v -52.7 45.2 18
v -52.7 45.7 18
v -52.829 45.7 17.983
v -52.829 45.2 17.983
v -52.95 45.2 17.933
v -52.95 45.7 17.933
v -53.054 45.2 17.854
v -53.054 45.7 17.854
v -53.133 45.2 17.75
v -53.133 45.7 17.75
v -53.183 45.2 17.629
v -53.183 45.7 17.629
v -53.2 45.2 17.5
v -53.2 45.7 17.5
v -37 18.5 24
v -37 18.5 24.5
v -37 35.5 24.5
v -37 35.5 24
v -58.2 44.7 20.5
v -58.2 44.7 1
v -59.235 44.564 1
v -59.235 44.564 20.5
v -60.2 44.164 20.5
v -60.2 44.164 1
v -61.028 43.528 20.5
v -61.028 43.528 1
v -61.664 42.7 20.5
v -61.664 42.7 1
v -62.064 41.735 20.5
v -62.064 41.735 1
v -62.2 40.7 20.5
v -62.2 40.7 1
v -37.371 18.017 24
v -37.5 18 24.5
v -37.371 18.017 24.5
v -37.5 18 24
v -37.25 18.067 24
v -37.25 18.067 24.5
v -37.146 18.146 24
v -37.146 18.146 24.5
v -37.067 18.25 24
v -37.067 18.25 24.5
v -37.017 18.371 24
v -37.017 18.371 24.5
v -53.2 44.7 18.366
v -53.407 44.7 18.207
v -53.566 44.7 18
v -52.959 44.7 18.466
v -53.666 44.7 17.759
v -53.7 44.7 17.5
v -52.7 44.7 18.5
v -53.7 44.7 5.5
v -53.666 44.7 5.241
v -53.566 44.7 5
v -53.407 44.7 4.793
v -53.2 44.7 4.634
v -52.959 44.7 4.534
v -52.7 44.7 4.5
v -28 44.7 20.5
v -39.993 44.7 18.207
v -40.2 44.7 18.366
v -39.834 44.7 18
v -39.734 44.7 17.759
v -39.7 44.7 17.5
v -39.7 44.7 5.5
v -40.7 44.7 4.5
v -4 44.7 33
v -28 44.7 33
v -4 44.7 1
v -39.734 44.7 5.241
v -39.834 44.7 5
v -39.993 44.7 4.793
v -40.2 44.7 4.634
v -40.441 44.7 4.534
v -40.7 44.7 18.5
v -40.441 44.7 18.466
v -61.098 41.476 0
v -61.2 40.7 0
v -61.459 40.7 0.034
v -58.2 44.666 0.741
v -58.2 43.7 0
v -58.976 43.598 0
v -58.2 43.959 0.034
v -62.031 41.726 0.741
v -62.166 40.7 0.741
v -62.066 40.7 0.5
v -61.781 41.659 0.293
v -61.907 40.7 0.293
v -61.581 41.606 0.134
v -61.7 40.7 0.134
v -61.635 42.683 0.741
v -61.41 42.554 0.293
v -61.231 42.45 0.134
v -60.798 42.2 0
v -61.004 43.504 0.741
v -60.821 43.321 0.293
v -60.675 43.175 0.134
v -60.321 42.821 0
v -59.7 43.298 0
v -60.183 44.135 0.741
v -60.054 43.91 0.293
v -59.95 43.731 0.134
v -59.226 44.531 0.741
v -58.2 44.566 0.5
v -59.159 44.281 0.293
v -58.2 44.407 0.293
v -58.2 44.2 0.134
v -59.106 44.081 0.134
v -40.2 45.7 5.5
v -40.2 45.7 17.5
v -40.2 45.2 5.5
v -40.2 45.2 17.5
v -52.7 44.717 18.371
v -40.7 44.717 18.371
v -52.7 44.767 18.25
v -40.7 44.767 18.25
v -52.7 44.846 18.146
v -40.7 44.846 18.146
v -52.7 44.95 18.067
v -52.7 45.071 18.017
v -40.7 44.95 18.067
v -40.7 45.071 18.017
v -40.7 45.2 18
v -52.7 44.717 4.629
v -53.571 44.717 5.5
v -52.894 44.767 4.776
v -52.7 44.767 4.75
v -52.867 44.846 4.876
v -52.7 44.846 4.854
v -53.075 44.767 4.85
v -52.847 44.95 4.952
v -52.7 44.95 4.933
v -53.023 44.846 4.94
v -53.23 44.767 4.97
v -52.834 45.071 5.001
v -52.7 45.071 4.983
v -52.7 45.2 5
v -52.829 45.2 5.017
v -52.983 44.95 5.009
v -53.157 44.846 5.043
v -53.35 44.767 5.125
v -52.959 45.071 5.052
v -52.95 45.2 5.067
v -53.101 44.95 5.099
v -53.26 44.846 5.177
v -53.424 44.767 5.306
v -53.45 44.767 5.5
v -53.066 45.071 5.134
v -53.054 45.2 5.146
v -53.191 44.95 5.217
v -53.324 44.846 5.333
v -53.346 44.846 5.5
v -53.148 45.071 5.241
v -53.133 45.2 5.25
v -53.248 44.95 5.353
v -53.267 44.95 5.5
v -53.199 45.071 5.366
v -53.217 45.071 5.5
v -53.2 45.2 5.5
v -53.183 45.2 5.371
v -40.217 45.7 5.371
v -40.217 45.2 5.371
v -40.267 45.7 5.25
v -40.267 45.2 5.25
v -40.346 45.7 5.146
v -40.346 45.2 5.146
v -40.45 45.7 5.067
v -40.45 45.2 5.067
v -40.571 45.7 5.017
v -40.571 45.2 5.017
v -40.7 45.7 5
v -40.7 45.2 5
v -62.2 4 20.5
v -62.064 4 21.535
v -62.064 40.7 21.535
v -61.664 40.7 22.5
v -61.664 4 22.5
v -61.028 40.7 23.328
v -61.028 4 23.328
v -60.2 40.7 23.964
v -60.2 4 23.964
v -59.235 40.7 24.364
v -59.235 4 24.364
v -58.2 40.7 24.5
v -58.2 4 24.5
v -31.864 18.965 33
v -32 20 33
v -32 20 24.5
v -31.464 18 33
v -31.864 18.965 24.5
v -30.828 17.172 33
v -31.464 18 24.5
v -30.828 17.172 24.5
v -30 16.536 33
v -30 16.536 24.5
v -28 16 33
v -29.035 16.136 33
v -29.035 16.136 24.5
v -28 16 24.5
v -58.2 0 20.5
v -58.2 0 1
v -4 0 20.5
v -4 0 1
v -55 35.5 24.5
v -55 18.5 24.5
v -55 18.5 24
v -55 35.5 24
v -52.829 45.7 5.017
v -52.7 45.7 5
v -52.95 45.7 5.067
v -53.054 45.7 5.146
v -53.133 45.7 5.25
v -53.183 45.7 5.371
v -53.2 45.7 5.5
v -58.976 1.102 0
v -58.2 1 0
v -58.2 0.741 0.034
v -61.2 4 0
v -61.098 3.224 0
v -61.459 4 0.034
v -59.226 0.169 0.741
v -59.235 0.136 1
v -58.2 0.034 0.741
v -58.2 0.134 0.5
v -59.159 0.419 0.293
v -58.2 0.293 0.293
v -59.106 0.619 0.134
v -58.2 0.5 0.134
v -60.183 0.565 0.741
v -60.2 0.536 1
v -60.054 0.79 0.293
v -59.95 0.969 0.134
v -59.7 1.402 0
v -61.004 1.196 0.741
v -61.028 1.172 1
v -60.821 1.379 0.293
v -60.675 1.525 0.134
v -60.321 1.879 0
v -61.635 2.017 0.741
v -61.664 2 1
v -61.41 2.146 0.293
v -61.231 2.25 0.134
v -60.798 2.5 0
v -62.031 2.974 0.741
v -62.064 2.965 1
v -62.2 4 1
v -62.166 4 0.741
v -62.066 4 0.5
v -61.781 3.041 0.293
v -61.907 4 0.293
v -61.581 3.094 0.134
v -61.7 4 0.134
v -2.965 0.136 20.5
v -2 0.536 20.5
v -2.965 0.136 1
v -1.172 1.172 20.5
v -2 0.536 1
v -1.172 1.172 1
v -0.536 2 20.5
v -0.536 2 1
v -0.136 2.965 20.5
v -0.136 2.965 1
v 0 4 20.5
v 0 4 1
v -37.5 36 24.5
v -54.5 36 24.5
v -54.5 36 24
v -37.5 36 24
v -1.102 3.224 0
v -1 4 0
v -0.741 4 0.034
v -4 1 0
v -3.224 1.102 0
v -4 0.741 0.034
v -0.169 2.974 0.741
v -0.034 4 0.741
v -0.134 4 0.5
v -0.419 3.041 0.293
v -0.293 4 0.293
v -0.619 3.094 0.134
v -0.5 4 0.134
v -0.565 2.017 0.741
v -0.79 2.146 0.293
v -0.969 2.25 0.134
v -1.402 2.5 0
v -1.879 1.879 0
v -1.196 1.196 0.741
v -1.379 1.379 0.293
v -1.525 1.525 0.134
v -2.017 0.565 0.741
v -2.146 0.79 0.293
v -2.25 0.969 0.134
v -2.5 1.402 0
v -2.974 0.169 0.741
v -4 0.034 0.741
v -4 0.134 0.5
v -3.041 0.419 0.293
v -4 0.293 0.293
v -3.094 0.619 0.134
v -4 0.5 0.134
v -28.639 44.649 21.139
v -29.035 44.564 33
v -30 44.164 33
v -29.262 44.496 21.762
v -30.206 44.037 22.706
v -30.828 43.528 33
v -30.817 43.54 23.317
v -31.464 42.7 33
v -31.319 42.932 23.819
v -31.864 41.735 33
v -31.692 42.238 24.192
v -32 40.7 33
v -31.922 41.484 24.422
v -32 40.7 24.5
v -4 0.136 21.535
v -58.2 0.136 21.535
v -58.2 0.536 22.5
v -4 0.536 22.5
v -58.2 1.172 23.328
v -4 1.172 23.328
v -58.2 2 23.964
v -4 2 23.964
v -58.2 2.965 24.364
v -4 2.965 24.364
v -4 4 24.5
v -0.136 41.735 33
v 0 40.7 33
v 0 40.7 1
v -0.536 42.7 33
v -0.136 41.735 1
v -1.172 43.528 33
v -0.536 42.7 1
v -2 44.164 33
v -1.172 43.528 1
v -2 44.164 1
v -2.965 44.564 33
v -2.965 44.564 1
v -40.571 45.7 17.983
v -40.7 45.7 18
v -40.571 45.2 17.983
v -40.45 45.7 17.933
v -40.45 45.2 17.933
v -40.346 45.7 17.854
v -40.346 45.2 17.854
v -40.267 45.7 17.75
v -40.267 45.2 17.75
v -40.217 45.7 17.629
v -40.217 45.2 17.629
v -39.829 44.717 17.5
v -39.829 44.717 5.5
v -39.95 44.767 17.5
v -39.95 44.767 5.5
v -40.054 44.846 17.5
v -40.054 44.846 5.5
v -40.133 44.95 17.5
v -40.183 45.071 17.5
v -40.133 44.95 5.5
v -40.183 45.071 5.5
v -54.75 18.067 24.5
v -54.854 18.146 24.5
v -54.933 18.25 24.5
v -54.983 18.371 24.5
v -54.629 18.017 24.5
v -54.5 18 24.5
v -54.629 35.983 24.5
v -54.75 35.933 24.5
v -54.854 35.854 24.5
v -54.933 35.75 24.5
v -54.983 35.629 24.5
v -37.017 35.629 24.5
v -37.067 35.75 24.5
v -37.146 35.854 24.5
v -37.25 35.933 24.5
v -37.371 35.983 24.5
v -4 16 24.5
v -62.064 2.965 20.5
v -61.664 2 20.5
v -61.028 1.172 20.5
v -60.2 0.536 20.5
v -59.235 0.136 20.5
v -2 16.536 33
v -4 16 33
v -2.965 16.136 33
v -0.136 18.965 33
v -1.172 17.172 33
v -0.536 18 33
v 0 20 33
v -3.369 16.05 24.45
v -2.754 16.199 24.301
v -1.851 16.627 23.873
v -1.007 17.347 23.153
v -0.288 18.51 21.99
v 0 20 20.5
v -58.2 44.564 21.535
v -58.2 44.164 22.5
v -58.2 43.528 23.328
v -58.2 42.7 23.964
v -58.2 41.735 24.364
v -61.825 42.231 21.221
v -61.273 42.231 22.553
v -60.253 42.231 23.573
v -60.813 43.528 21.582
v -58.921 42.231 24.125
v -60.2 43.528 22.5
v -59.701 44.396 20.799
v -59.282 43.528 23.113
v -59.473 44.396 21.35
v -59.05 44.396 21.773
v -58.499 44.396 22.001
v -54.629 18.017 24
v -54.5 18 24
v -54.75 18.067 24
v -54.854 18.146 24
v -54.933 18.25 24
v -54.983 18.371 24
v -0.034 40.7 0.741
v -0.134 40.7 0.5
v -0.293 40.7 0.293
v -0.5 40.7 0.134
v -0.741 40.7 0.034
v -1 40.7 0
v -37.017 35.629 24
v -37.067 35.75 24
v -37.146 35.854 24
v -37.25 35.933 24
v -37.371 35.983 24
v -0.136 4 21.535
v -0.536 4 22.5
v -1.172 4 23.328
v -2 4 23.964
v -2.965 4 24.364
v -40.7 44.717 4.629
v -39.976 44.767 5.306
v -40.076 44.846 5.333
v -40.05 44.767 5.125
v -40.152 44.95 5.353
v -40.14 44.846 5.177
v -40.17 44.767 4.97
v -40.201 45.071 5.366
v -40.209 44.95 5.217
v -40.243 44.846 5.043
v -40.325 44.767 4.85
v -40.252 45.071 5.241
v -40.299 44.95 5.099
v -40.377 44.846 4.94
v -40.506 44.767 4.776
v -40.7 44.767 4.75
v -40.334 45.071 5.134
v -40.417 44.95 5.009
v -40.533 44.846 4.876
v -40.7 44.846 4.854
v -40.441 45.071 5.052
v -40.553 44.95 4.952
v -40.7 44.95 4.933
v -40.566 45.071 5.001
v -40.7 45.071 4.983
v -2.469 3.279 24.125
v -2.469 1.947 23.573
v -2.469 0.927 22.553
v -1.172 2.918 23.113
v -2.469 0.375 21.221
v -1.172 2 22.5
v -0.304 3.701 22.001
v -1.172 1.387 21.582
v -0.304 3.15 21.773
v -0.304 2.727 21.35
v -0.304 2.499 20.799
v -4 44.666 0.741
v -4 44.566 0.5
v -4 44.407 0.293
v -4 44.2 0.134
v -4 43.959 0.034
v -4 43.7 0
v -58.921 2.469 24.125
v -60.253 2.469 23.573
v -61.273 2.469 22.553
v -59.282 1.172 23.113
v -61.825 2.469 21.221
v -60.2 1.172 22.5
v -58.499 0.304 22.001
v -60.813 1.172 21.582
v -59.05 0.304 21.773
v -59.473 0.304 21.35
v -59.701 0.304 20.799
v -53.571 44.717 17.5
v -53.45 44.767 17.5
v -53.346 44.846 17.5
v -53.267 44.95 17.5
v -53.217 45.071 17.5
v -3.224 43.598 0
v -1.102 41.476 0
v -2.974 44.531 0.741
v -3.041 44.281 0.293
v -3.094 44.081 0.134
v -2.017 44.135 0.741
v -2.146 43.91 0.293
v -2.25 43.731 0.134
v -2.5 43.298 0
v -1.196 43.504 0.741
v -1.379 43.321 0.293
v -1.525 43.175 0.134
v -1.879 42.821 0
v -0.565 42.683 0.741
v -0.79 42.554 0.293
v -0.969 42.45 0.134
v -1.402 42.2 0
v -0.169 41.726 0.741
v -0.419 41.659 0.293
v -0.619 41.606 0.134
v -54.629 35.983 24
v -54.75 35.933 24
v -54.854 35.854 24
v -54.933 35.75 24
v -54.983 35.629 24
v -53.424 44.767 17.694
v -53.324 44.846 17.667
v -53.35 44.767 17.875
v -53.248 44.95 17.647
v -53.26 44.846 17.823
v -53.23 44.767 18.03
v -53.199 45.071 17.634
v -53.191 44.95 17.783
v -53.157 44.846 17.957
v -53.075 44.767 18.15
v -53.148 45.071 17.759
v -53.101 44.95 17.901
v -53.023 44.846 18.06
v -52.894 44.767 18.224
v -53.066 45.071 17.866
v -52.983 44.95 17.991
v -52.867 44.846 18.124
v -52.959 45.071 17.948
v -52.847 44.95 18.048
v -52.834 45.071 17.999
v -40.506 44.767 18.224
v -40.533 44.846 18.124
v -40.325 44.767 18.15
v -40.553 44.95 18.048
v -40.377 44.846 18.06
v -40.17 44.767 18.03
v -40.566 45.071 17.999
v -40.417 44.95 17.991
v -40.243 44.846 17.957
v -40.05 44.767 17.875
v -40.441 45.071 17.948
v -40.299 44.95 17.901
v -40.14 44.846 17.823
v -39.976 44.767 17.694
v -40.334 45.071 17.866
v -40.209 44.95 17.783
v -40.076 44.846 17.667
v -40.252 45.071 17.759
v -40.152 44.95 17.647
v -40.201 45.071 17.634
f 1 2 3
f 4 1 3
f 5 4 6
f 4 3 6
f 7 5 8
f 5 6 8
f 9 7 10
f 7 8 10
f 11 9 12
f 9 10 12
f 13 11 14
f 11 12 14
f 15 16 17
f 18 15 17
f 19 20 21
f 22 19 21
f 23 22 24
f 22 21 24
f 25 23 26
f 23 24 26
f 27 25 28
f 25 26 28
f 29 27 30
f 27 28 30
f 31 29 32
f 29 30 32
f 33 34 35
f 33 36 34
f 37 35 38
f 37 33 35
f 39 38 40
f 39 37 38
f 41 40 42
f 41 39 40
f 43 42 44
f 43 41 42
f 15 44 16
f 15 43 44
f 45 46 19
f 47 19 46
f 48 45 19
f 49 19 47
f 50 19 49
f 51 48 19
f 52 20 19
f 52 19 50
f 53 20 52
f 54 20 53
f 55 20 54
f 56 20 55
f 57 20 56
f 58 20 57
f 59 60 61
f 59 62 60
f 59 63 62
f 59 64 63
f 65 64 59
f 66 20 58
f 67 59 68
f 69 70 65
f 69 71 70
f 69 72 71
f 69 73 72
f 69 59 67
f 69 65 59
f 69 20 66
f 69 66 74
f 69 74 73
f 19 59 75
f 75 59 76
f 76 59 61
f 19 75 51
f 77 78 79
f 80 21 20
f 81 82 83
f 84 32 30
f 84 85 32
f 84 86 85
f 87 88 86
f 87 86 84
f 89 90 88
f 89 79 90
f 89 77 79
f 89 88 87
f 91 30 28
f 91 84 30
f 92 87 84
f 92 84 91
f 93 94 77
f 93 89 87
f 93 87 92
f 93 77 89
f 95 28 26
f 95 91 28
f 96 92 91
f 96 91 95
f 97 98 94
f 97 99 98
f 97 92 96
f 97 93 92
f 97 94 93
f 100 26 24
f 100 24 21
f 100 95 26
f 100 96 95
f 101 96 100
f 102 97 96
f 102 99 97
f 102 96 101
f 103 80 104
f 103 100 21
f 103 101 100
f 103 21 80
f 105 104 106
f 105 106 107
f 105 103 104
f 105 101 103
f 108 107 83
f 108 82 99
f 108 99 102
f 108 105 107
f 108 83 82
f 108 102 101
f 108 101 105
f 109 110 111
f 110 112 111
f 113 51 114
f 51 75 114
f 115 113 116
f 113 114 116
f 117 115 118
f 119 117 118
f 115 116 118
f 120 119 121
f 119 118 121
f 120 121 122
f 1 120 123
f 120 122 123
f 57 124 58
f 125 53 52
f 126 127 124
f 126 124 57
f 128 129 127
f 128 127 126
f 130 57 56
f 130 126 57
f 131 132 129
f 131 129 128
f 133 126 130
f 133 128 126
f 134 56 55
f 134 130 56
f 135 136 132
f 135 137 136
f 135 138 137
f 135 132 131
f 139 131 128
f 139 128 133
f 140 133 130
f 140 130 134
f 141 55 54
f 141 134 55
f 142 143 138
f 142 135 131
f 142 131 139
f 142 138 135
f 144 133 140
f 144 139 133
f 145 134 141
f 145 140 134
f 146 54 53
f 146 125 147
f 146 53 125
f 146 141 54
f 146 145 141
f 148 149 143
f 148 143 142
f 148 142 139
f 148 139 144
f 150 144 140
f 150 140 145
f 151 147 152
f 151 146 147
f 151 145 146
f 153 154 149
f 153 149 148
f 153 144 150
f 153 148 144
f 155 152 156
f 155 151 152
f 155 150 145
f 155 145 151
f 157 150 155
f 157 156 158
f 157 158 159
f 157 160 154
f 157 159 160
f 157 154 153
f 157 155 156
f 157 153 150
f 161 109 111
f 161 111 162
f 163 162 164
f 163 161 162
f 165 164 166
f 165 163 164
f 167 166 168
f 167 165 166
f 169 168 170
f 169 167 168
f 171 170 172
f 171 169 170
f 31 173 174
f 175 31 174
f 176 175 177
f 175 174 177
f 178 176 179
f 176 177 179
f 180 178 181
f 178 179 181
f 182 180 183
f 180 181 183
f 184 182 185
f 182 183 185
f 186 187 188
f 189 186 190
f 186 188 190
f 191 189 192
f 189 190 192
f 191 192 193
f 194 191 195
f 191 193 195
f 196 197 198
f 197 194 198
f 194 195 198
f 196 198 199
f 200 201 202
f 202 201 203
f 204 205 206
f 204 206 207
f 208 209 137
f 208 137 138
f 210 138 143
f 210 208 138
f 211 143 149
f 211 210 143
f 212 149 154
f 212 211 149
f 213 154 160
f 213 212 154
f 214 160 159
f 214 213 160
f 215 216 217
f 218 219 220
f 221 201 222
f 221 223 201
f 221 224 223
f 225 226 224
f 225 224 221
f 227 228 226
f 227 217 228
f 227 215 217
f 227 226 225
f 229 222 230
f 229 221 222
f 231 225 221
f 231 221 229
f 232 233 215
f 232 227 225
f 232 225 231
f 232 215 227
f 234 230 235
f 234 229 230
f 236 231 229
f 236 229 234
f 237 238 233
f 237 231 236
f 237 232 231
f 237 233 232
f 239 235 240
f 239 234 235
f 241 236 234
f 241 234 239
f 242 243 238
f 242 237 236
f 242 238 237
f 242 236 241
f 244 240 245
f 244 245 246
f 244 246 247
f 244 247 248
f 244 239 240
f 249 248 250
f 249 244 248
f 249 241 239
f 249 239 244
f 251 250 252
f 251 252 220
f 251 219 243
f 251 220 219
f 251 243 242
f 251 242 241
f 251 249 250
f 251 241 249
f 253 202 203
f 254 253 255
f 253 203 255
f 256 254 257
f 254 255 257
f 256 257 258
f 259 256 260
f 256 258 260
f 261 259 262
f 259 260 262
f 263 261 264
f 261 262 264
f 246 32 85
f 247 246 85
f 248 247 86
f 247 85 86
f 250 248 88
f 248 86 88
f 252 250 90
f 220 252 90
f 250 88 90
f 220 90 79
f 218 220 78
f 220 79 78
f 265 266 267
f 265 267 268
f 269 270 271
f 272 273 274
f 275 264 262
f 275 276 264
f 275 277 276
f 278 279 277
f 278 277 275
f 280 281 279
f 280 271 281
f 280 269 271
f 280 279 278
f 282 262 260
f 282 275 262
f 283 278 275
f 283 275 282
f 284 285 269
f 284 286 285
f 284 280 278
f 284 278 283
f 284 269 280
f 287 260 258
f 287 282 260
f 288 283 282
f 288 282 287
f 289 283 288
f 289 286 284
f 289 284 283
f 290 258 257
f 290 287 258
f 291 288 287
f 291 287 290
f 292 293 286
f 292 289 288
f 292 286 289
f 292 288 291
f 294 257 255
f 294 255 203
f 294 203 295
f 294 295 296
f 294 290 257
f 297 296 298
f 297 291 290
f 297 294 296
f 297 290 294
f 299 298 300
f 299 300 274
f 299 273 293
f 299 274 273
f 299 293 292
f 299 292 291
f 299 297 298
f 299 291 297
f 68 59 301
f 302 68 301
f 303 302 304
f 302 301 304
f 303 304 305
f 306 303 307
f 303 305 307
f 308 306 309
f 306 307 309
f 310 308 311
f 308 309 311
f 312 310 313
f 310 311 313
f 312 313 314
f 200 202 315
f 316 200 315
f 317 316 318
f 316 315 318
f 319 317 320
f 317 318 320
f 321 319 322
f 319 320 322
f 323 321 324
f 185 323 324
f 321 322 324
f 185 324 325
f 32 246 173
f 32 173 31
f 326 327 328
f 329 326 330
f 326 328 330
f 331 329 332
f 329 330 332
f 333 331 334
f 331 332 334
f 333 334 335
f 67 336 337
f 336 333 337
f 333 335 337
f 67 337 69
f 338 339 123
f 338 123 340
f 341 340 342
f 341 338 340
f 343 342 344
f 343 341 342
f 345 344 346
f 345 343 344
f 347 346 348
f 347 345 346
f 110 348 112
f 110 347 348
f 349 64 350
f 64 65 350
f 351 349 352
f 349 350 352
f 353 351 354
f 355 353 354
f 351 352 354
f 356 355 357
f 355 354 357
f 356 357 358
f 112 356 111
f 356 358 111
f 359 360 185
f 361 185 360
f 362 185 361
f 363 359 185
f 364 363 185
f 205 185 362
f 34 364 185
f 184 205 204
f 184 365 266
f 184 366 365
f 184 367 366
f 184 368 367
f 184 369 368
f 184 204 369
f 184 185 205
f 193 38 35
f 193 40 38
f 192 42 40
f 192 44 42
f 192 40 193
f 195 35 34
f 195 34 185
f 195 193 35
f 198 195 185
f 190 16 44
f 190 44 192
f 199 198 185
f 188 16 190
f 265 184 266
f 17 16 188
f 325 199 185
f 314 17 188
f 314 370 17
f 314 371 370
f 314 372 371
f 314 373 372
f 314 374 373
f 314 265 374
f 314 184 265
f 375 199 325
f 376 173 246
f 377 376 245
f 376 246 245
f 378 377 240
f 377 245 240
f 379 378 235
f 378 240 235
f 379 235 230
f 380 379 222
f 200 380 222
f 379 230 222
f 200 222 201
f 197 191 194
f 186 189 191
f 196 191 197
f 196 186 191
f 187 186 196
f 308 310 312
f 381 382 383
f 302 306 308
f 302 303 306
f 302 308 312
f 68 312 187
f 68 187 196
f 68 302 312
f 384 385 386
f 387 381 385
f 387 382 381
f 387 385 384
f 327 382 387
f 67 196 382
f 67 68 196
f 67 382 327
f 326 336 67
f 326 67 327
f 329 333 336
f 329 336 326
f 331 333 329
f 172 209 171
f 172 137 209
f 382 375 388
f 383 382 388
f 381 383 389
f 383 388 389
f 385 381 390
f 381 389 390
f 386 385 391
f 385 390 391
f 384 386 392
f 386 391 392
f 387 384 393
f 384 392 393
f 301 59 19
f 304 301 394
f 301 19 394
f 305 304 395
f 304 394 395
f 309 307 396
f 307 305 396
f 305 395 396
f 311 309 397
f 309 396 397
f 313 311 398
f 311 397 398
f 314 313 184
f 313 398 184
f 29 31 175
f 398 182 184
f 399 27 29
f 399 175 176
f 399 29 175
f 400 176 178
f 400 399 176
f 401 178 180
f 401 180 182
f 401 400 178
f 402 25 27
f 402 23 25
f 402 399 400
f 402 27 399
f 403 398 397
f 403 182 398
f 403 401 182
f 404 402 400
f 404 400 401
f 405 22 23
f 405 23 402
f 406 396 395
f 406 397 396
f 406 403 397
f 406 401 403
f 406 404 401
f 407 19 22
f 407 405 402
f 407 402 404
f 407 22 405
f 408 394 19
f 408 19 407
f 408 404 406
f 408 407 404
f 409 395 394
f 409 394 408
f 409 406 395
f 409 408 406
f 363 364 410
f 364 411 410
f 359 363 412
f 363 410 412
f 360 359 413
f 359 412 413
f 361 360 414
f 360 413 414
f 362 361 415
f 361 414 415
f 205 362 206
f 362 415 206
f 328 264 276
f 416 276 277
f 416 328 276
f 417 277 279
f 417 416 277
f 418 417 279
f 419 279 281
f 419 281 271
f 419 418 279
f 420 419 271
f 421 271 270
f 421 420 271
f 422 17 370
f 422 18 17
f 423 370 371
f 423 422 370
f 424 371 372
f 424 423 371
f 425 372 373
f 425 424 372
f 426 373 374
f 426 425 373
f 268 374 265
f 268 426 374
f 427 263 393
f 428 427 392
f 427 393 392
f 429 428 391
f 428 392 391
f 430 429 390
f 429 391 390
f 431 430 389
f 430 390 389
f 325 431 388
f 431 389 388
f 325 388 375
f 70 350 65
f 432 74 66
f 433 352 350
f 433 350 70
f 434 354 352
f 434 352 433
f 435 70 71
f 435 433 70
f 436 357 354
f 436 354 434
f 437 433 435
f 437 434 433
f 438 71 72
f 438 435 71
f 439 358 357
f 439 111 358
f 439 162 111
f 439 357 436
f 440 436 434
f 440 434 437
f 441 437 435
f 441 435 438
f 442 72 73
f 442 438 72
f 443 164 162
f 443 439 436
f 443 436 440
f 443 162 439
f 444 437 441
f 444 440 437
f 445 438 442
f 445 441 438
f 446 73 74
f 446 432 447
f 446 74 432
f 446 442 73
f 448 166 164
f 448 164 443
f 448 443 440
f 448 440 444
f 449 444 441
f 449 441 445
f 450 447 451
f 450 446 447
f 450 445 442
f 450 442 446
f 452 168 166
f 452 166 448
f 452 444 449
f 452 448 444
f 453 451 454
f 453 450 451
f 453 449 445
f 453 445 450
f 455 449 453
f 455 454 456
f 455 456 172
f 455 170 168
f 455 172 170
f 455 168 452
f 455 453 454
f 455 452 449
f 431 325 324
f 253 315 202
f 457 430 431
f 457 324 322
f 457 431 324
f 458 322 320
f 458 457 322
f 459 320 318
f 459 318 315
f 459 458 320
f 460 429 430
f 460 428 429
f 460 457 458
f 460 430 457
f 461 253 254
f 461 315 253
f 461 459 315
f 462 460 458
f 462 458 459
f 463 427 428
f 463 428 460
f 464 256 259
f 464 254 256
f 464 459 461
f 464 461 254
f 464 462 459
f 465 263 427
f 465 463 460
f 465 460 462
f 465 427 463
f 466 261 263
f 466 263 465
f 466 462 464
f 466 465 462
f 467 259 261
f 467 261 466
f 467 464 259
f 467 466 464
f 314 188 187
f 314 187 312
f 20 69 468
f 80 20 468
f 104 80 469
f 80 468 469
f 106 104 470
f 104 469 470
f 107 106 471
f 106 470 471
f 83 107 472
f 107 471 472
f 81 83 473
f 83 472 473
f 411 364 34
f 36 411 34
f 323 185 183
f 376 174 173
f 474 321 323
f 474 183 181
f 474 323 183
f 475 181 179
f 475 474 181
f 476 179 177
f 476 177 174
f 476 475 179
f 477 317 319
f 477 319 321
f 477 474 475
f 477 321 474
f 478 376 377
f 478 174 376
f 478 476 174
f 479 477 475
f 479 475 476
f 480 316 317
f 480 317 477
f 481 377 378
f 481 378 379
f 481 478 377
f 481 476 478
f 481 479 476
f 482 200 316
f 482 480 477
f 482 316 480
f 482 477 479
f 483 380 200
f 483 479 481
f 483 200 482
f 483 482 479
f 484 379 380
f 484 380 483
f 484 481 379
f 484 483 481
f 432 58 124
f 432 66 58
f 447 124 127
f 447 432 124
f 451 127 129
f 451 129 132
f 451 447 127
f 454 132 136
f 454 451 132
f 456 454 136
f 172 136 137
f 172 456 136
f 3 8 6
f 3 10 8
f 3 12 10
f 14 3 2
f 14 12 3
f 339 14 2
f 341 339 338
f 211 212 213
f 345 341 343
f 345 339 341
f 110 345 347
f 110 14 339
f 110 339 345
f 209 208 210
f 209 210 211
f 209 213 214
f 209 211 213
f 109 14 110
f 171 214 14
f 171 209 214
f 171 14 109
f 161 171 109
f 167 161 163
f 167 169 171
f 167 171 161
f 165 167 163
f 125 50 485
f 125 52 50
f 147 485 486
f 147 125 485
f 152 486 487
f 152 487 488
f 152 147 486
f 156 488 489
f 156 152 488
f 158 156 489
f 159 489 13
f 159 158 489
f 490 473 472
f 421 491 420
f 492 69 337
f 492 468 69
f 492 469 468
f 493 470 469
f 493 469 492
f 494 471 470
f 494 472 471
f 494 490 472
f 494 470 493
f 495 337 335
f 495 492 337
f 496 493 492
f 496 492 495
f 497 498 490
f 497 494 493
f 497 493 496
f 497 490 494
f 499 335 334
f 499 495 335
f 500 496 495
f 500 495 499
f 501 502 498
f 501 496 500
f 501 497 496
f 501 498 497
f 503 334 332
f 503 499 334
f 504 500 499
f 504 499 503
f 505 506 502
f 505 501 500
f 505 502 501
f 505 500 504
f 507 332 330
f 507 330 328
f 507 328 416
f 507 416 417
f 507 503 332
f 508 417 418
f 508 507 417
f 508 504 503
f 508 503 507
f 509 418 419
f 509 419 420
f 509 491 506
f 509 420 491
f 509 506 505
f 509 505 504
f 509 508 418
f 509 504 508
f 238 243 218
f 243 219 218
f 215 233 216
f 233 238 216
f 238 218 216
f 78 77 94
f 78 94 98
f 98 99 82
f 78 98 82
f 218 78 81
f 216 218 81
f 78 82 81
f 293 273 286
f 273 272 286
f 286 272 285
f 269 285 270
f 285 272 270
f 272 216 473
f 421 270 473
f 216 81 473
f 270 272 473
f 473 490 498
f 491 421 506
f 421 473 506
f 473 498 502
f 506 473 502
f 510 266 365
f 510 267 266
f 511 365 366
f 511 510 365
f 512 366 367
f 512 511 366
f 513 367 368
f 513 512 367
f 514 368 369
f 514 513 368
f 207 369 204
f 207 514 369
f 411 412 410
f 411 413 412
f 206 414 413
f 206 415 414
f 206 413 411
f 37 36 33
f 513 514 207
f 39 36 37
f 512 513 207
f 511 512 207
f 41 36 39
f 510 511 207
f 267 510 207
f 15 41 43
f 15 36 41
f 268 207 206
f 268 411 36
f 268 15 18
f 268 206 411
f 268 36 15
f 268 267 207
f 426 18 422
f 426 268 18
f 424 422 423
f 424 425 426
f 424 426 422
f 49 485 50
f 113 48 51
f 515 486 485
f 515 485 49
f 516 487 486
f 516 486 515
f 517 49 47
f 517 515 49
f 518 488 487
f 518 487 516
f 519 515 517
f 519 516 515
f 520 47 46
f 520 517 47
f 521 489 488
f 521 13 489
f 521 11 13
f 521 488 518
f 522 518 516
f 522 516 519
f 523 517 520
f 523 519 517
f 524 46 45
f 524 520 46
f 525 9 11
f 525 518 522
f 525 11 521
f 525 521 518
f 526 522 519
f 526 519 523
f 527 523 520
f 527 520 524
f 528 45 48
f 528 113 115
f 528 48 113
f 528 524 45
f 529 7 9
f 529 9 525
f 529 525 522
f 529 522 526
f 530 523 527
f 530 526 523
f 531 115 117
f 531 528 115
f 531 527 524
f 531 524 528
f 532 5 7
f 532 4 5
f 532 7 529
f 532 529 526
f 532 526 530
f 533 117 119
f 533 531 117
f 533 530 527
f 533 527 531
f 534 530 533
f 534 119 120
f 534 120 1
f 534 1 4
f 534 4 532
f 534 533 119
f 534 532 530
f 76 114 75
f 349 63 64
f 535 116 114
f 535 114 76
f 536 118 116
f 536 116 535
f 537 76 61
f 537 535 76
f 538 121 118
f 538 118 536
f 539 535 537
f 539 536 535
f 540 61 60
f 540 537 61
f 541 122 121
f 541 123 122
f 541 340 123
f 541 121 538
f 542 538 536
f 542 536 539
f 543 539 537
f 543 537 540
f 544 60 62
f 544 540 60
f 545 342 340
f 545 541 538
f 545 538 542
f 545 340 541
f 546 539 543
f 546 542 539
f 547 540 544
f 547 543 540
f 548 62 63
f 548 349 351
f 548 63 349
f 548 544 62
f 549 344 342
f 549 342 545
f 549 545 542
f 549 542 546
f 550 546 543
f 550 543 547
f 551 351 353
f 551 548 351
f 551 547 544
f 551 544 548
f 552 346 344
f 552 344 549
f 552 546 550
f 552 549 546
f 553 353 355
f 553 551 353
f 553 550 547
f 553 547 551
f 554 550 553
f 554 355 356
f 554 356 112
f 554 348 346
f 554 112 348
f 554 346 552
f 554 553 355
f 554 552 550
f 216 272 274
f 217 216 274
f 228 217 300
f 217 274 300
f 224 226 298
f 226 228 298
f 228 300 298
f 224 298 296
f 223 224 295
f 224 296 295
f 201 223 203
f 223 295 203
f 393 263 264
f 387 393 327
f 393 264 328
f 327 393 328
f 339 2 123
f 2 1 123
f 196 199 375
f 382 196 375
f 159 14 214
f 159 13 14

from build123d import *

# Parameters (mm, degrees)
CROQUIS1_W              = 62.2
CROQUIS1_H              = 44.7
SALIENTE_EXTRUIR1_DEPTH = 24.5
CROQUIS2_W              = 32
CROQUIS2_H              = 28.7
SALIENTE_EXTRUIR2_DEPTH = 8.5
CROQUIS3_W              = 18
CROQUIS3_H              = 18
CORTAR_EXTRUIR1_DEPTH   = 0.5
CROQUIS4_W              = 13
CROQUIS4_H              = 13
SALIENTE_EXTRUIR3_DEPTH = 1
REDONDEO2_R             = 0.5
REDONDEO3_R             = 1
REDONDEO1_R             = 4


with BuildPart() as part:
    # Croquis1 → Saliente-Extruir1 (new body)
    with BuildSketch(Plane.XY):
        with Locations((-31.1, 22.35)):
            Rectangle(CROQUIS1_W, CROQUIS1_H)
    extrude(amount=SALIENTE_EXTRUIR1_DEPTH)

    # Croquis2 → Saliente-Extruir2 (add)
    with BuildSketch(Plane.XY.offset(24.5)):
        with Locations((-16, 30.35)):
            Rectangle(CROQUIS2_W, CROQUIS2_H)
    extrude(amount=SALIENTE_EXTRUIR2_DEPTH)

    # Croquis3 → Cortar-Extruir1 (cut)
    with BuildSketch(Plane.XY.offset(24.5)):
        with Locations((-46, 27)):
            Rectangle(CROQUIS3_W, CROQUIS3_H)
    extrude(amount=-CORTAR_EXTRUIR1_DEPTH, mode=Mode.SUBTRACT)

    # Croquis4 → Saliente-Extruir3 (add)
    with BuildSketch(Plane(origin=(0, 44.7, 0), x_dir=(1, 0, 0), z_dir=(0, 1, 0))):
        with Locations((-46.7, -11.5)):
            Rectangle(CROQUIS4_W, CROQUIS4_H)
    extrude(amount=SALIENTE_EXTRUIR3_DEPTH)

    # Redondeo2
    redondeo2_edges = [part.edges().sort_by_distance(p)[0] for p in [
        (-55, 18, 24.25),
        (-55, 36, 24.25),
        (-37, 36, 24.25),
        (-37, 18, 24.25),
        (-40.2, 44.7, 11.5),
        (-40.2, 45.2, 18),
        (-46.7, 44.7, 5),
        (-40.2, 45.2, 5),
        (-53.2, 44.7, 11.5),
        (-53.2, 45.2, 5),
        (-46.7, 44.7, 18),
        (-53.2, 45.2, 18),
    ]]
    fillet(redondeo2_edges, radius=REDONDEO2_R)

    # Redondeo3
    redondeo3_edges = [part.edges().sort_by_distance(p)[0] for p in [
        (-31.1, 0, 0),
        (-62.2, 22.35, 0),
        (-31.1, 44.7, 0),
        (0, 22.35, 0),
    ]]
    fillet(redondeo3_edges, radius=REDONDEO3_R)

    # Redondeo1
    # the kernel refuses this fillet: 4 mm, written as the material it takes off along each edge
    with BuildSketch(Plane(origin=(-4, 40.7, 0), x_dir=(0, 1, 0), z_dir=(-1, 0, 0))) as redondeo1_piece_1:
        with BuildLine():
            CenterArc((3, -1), 1, 0, 90)
            Line((4, -1), (4, 0))
            Line((4, 0), (3, 0))
        make_face()
    revolve(axis=Axis((-4, 40.7, 0), (0, 0, -1)), revolution_arc=90, mode=Mode.SUBTRACT)
    with BuildSketch(Plane(origin=(-4, 4, 0), x_dir=(1, 0, 0), z_dir=(0, 1, 0))) as redondeo1_piece_2:
        with BuildLine():
            CenterArc((3, -1), 1, 0, 90)
            Line((4, -1), (4, 0))
            Line((4, 0), (3, 0))
        make_face()
    revolve(axis=Axis((-4, 4, 0), (0, 0, -1)), revolution_arc=90, mode=Mode.SUBTRACT)
    with BuildSketch(Plane(origin=(-58.2, 40.7, 0), x_dir=(-1, 0, 0), z_dir=(0, -1, 0))) as redondeo1_piece_3:
        with BuildLine():
            CenterArc((3, -1), 1, 0, 90)
            Line((4, -1), (4, 0))
            Line((4, 0), (3, 0))
        make_face()
    revolve(axis=Axis((-58.2, 40.7, 0), (0, 0, -1)), revolution_arc=90, mode=Mode.SUBTRACT)
    with BuildSketch(Plane(origin=(-58.2, 4, 0), x_dir=(0, -1, 0), z_dir=(1, 0, 0))) as redondeo1_piece_4:
        with BuildLine():
            CenterArc((3, -1), 1, 0, 90)
            Line((4, -1), (4, 0))
            Line((4, 0), (3, 0))
        make_face()
    revolve(axis=Axis((-58.2, 4, 0), (0, 0, -1)), revolution_arc=90, mode=Mode.SUBTRACT)
    with BuildSketch(Plane(origin=(-58.2, 4, 20.5), x_dir=(0, 0, 1), z_dir=(0, -1, 0))) as redondeo1_piece_5_section:
        Polygon((0, 0), (REDONDEO1_R, 0), (REDONDEO1_R, REDONDEO1_R), (0, REDONDEO1_R), align=None)
    redondeo1_piece_5 = extrude(amount=REDONDEO1_R, mode=Mode.PRIVATE)
    redondeo1_piece_5 = redondeo1_piece_5 - Plane(origin=(-58.2, 4, 20.5), x_dir=(0.7071067811865475, 0, -0.7071067811865475), z_dir=(0, -1, 0)) * Sphere(REDONDEO1_R, mode=Mode.PRIVATE)
    add(redondeo1_piece_5, mode=Mode.SUBTRACT)
    with BuildSketch(Plane(origin=(-58.2, 40.7, 20.5), x_dir=(0, 0, 1), z_dir=(0, 1, 0))) as redondeo1_piece_6_section:
        Polygon((0, 0), (REDONDEO1_R, 0), (REDONDEO1_R, -REDONDEO1_R), (0, -REDONDEO1_R), align=None)
    redondeo1_piece_6 = extrude(amount=REDONDEO1_R, mode=Mode.PRIVATE)
    redondeo1_piece_6 = redondeo1_piece_6 - Plane(origin=(-58.2, 40.7, 20.5), x_dir=(0.7071067811865475, 0, -0.7071067811865475), z_dir=(0, 1, 0)) * Sphere(REDONDEO1_R, mode=Mode.PRIVATE)
    add(redondeo1_piece_6, mode=Mode.SUBTRACT)
    with BuildSketch(Plane(origin=(-4, 4, 20.5), x_dir=(0, -1, 0), z_dir=(1, 0, 0))) as redondeo1_piece_7_section:
        Polygon((0, 0), (REDONDEO1_R, 0), (REDONDEO1_R, -REDONDEO1_R), (0, -REDONDEO1_R), align=None)
    redondeo1_piece_7 = extrude(amount=REDONDEO1_R, mode=Mode.PRIVATE)
    redondeo1_piece_7 = redondeo1_piece_7 - Plane(origin=(-4, 4, 20.5), x_dir=(0, 0.7071067811865475, -0.7071067811865475), z_dir=(1, 0, 0)) * Sphere(REDONDEO1_R, mode=Mode.PRIVATE)
    add(redondeo1_piece_7, mode=Mode.SUBTRACT)
    with BuildSketch(Plane(origin=(-62.2, 4, 24.5), x_dir=(1, 0, 0), z_dir=(0, 1, 0))) as redondeo1_piece_8:
        with BuildLine():
            CenterArc((REDONDEO1_R, REDONDEO1_R), REDONDEO1_R, 180, 90)
            Line((0, REDONDEO1_R), (0, 0))
            Line((0, 0), (REDONDEO1_R, 0))
        make_face()
    extrude(amount=36.7, mode=Mode.SUBTRACT)
    with BuildSketch(Plane(origin=(-4, 0, 24.5), x_dir=(0, 0, -1), z_dir=(-1, 0, 0))) as redondeo1_piece_9:
        with BuildLine():
            CenterArc((REDONDEO1_R, -REDONDEO1_R), REDONDEO1_R, 90, 90)
            Line((0, -REDONDEO1_R), (0, 0))
            Line((0, 0), (REDONDEO1_R, 0))
        make_face()
    extrude(amount=54.2, mode=Mode.SUBTRACT)
    with BuildSketch(Plane(origin=(-58.2, 44.7, 24.5), x_dir=(0, 0, -1), z_dir=(1, 0, 0))) as redondeo1_piece_10:
        with BuildLine():
            CenterArc((REDONDEO1_R, -REDONDEO1_R), REDONDEO1_R, 90, 90)
            Line((0, -REDONDEO1_R), (0, 0))
            Line((0, 0), (REDONDEO1_R, 0))
        make_face()
    extrude(amount=26.2, mode=Mode.SUBTRACT)
    with BuildSketch(Plane(origin=(0, 16, 24.5), x_dir=(0, 1, 0), z_dir=(0, 0, 1)), Plane(origin=(-32, 16, 24.5), x_dir=(1, 0, 0), z_dir=(0, 0, 1))) as redondeo1_piece_11:
        with BuildLine():
            CenterArc((REDONDEO1_R, REDONDEO1_R), REDONDEO1_R, 180, 90)
            Line((0, REDONDEO1_R), (0, 0))
            Line((0, 0), (REDONDEO1_R, 0))
        make_face()
    extrude(amount=18.5, mode=Mode.SUBTRACT)
    with BuildSketch(Plane(origin=(-32, 44.7, 24.5), x_dir=(1, 0, 0), z_dir=(0, 0, 1))) as redondeo1_piece_12:
        with BuildLine():
            CenterArc((REDONDEO1_R, -REDONDEO1_R), REDONDEO1_R, 90, 90)
            Line((0, -REDONDEO1_R), (0, 0))
            Line((0, 0), (REDONDEO1_R, 0))
        make_face()
    extrude(amount=18.5, mode=Mode.SUBTRACT)
    with BuildSketch(Plane(origin=(0, 16, 24.5), x_dir=(0, 0, -1), z_dir=(0, -1, 0))) as redondeo1_piece_13:
        with BuildLine():
            CenterArc((REDONDEO1_R, -REDONDEO1_R), REDONDEO1_R, 90, 90)
            Line((0, -REDONDEO1_R), (0, 0))
            Line((0, 0), (REDONDEO1_R, 0))
        make_face()
    extrude(amount=12, mode=Mode.SUBTRACT)
    with BuildSketch(Plane(origin=(0, 0, 0), x_dir=(0, 1, 0), z_dir=(0, 0, 1)), Plane(origin=(-62.2, 0, 0), x_dir=(1, 0, 0), z_dir=(0, 0, 1))) as redondeo1_piece_14:
        with BuildLine():
            CenterArc((REDONDEO1_R, REDONDEO1_R), REDONDEO1_R, 180, 90)
            Line((0, REDONDEO1_R), (0, 0))
            Line((0, 0), (REDONDEO1_R, 0))
        make_face()
    extrude(amount=20.5, mode=Mode.SUBTRACT)
    with BuildSketch(Plane(origin=(-62.2, 44.7, 0), x_dir=(1, 0, 0), z_dir=(0, 0, 1))) as redondeo1_piece_15:
        with BuildLine():
            CenterArc((REDONDEO1_R, -REDONDEO1_R), REDONDEO1_R, 90, 90)
            Line((0, -REDONDEO1_R), (0, 0))
            Line((0, 0), (REDONDEO1_R, 0))
        make_face()
    extrude(amount=20.5, mode=Mode.SUBTRACT)
    with BuildSketch(Plane(origin=(0, 44.7, 0), x_dir=(0, -1, 0), z_dir=(0, 0, 1))) as redondeo1_piece_16:
        with BuildLine():
            CenterArc((REDONDEO1_R, -REDONDEO1_R), REDONDEO1_R, 90, 90)
            Line((0, -REDONDEO1_R), (0, 0))
            Line((0, 0), (REDONDEO1_R, 0))
        make_face()
    extrude(amount=43, mode=Mode.SUBTRACT)
    with BuildSketch(Plane(origin=(-58.2, 44.7, 24.5), x_dir=(0, 0, -1), z_dir=(1, 0, 0))) as redondeo1_piece_17a_section:
        with BuildLine():
            CenterArc((REDONDEO1_R, -REDONDEO1_R), REDONDEO1_R, 90, 90)
            Line((0, -REDONDEO1_R), (0, 0))
            Line((0, 0), (REDONDEO1_R, 0))
        make_face()
    redondeo1_piece_17a = extrude(amount=36.2, mode=Mode.PRIVATE)
    redondeo1_piece_17a = split(redondeo1_piece_17a, bisect_by=Plane(origin=(-32, 43.794419543, 23.594419543), z_dir=(1, 0, 0)), keep=Keep.TOP, mode=Mode.PRIVATE)
    with BuildSketch(Plane(origin=(-32, 44.7, 14.5), x_dir=(1, 0, 0), z_dir=(0, 0, 1))) as redondeo1_piece_17b_section:
        with BuildLine():
            CenterArc((REDONDEO1_R, -REDONDEO1_R), REDONDEO1_R, 90, 90)
            Line((0, -REDONDEO1_R), (0, 0))
            Line((0, 0), (REDONDEO1_R, 0))
        make_face()
    redondeo1_piece_17b = extrude(amount=28.5, mode=Mode.PRIVATE)
    redondeo1_piece_17b = split(redondeo1_piece_17b, bisect_by=Plane(origin=(-31.094419543, 43.794419543, 24.5), z_dir=(0, 0, -1)), keep=Keep.TOP, mode=Mode.PRIVATE)
    redondeo1_piece_17 = redondeo1_piece_17a & redondeo1_piece_17b
    add(redondeo1_piece_17, mode=Mode.SUBTRACT)
    with BuildSketch(Plane(origin=(0, 16, 14.5), x_dir=(0, 1, 0), z_dir=(0, 0, 1))) as redondeo1_piece_18a_section:
        with BuildLine():
            CenterArc((REDONDEO1_R, REDONDEO1_R), REDONDEO1_R, 180, 90)
            Line((0, REDONDEO1_R), (0, 0))
            Line((0, 0), (REDONDEO1_R, 0))
        make_face()
    redondeo1_piece_18a = extrude(amount=28.5, mode=Mode.PRIVATE)
    redondeo1_piece_18a = split(redondeo1_piece_18a, bisect_by=Plane(origin=(-0.905580457, 16.905580457, 24.5), z_dir=(0, 0, -1)), keep=Keep.TOP, mode=Mode.PRIVATE)
    with BuildSketch(Plane(origin=(0, 26, 24.5), x_dir=(0, 0, -1), z_dir=(0, -1, 0))) as redondeo1_piece_18b_section:
        with BuildLine():
            CenterArc((REDONDEO1_R, -REDONDEO1_R), REDONDEO1_R, 90, 90)
            Line((0, -REDONDEO1_R), (0, 0))
            Line((0, 0), (REDONDEO1_R, 0))
        make_face()
    redondeo1_piece_18b = extrude(amount=22, mode=Mode.PRIVATE)
    redondeo1_piece_18b = split(redondeo1_piece_18b, bisect_by=Plane(origin=(-0.905580457, 16, 23.594419543), z_dir=(0, 1, 0)), keep=Keep.TOP, mode=Mode.PRIVATE)
    redondeo1_piece_18 = redondeo1_piece_18a & redondeo1_piece_18b
    add(redondeo1_piece_18, mode=Mode.SUBTRACT)


solid = part.part
